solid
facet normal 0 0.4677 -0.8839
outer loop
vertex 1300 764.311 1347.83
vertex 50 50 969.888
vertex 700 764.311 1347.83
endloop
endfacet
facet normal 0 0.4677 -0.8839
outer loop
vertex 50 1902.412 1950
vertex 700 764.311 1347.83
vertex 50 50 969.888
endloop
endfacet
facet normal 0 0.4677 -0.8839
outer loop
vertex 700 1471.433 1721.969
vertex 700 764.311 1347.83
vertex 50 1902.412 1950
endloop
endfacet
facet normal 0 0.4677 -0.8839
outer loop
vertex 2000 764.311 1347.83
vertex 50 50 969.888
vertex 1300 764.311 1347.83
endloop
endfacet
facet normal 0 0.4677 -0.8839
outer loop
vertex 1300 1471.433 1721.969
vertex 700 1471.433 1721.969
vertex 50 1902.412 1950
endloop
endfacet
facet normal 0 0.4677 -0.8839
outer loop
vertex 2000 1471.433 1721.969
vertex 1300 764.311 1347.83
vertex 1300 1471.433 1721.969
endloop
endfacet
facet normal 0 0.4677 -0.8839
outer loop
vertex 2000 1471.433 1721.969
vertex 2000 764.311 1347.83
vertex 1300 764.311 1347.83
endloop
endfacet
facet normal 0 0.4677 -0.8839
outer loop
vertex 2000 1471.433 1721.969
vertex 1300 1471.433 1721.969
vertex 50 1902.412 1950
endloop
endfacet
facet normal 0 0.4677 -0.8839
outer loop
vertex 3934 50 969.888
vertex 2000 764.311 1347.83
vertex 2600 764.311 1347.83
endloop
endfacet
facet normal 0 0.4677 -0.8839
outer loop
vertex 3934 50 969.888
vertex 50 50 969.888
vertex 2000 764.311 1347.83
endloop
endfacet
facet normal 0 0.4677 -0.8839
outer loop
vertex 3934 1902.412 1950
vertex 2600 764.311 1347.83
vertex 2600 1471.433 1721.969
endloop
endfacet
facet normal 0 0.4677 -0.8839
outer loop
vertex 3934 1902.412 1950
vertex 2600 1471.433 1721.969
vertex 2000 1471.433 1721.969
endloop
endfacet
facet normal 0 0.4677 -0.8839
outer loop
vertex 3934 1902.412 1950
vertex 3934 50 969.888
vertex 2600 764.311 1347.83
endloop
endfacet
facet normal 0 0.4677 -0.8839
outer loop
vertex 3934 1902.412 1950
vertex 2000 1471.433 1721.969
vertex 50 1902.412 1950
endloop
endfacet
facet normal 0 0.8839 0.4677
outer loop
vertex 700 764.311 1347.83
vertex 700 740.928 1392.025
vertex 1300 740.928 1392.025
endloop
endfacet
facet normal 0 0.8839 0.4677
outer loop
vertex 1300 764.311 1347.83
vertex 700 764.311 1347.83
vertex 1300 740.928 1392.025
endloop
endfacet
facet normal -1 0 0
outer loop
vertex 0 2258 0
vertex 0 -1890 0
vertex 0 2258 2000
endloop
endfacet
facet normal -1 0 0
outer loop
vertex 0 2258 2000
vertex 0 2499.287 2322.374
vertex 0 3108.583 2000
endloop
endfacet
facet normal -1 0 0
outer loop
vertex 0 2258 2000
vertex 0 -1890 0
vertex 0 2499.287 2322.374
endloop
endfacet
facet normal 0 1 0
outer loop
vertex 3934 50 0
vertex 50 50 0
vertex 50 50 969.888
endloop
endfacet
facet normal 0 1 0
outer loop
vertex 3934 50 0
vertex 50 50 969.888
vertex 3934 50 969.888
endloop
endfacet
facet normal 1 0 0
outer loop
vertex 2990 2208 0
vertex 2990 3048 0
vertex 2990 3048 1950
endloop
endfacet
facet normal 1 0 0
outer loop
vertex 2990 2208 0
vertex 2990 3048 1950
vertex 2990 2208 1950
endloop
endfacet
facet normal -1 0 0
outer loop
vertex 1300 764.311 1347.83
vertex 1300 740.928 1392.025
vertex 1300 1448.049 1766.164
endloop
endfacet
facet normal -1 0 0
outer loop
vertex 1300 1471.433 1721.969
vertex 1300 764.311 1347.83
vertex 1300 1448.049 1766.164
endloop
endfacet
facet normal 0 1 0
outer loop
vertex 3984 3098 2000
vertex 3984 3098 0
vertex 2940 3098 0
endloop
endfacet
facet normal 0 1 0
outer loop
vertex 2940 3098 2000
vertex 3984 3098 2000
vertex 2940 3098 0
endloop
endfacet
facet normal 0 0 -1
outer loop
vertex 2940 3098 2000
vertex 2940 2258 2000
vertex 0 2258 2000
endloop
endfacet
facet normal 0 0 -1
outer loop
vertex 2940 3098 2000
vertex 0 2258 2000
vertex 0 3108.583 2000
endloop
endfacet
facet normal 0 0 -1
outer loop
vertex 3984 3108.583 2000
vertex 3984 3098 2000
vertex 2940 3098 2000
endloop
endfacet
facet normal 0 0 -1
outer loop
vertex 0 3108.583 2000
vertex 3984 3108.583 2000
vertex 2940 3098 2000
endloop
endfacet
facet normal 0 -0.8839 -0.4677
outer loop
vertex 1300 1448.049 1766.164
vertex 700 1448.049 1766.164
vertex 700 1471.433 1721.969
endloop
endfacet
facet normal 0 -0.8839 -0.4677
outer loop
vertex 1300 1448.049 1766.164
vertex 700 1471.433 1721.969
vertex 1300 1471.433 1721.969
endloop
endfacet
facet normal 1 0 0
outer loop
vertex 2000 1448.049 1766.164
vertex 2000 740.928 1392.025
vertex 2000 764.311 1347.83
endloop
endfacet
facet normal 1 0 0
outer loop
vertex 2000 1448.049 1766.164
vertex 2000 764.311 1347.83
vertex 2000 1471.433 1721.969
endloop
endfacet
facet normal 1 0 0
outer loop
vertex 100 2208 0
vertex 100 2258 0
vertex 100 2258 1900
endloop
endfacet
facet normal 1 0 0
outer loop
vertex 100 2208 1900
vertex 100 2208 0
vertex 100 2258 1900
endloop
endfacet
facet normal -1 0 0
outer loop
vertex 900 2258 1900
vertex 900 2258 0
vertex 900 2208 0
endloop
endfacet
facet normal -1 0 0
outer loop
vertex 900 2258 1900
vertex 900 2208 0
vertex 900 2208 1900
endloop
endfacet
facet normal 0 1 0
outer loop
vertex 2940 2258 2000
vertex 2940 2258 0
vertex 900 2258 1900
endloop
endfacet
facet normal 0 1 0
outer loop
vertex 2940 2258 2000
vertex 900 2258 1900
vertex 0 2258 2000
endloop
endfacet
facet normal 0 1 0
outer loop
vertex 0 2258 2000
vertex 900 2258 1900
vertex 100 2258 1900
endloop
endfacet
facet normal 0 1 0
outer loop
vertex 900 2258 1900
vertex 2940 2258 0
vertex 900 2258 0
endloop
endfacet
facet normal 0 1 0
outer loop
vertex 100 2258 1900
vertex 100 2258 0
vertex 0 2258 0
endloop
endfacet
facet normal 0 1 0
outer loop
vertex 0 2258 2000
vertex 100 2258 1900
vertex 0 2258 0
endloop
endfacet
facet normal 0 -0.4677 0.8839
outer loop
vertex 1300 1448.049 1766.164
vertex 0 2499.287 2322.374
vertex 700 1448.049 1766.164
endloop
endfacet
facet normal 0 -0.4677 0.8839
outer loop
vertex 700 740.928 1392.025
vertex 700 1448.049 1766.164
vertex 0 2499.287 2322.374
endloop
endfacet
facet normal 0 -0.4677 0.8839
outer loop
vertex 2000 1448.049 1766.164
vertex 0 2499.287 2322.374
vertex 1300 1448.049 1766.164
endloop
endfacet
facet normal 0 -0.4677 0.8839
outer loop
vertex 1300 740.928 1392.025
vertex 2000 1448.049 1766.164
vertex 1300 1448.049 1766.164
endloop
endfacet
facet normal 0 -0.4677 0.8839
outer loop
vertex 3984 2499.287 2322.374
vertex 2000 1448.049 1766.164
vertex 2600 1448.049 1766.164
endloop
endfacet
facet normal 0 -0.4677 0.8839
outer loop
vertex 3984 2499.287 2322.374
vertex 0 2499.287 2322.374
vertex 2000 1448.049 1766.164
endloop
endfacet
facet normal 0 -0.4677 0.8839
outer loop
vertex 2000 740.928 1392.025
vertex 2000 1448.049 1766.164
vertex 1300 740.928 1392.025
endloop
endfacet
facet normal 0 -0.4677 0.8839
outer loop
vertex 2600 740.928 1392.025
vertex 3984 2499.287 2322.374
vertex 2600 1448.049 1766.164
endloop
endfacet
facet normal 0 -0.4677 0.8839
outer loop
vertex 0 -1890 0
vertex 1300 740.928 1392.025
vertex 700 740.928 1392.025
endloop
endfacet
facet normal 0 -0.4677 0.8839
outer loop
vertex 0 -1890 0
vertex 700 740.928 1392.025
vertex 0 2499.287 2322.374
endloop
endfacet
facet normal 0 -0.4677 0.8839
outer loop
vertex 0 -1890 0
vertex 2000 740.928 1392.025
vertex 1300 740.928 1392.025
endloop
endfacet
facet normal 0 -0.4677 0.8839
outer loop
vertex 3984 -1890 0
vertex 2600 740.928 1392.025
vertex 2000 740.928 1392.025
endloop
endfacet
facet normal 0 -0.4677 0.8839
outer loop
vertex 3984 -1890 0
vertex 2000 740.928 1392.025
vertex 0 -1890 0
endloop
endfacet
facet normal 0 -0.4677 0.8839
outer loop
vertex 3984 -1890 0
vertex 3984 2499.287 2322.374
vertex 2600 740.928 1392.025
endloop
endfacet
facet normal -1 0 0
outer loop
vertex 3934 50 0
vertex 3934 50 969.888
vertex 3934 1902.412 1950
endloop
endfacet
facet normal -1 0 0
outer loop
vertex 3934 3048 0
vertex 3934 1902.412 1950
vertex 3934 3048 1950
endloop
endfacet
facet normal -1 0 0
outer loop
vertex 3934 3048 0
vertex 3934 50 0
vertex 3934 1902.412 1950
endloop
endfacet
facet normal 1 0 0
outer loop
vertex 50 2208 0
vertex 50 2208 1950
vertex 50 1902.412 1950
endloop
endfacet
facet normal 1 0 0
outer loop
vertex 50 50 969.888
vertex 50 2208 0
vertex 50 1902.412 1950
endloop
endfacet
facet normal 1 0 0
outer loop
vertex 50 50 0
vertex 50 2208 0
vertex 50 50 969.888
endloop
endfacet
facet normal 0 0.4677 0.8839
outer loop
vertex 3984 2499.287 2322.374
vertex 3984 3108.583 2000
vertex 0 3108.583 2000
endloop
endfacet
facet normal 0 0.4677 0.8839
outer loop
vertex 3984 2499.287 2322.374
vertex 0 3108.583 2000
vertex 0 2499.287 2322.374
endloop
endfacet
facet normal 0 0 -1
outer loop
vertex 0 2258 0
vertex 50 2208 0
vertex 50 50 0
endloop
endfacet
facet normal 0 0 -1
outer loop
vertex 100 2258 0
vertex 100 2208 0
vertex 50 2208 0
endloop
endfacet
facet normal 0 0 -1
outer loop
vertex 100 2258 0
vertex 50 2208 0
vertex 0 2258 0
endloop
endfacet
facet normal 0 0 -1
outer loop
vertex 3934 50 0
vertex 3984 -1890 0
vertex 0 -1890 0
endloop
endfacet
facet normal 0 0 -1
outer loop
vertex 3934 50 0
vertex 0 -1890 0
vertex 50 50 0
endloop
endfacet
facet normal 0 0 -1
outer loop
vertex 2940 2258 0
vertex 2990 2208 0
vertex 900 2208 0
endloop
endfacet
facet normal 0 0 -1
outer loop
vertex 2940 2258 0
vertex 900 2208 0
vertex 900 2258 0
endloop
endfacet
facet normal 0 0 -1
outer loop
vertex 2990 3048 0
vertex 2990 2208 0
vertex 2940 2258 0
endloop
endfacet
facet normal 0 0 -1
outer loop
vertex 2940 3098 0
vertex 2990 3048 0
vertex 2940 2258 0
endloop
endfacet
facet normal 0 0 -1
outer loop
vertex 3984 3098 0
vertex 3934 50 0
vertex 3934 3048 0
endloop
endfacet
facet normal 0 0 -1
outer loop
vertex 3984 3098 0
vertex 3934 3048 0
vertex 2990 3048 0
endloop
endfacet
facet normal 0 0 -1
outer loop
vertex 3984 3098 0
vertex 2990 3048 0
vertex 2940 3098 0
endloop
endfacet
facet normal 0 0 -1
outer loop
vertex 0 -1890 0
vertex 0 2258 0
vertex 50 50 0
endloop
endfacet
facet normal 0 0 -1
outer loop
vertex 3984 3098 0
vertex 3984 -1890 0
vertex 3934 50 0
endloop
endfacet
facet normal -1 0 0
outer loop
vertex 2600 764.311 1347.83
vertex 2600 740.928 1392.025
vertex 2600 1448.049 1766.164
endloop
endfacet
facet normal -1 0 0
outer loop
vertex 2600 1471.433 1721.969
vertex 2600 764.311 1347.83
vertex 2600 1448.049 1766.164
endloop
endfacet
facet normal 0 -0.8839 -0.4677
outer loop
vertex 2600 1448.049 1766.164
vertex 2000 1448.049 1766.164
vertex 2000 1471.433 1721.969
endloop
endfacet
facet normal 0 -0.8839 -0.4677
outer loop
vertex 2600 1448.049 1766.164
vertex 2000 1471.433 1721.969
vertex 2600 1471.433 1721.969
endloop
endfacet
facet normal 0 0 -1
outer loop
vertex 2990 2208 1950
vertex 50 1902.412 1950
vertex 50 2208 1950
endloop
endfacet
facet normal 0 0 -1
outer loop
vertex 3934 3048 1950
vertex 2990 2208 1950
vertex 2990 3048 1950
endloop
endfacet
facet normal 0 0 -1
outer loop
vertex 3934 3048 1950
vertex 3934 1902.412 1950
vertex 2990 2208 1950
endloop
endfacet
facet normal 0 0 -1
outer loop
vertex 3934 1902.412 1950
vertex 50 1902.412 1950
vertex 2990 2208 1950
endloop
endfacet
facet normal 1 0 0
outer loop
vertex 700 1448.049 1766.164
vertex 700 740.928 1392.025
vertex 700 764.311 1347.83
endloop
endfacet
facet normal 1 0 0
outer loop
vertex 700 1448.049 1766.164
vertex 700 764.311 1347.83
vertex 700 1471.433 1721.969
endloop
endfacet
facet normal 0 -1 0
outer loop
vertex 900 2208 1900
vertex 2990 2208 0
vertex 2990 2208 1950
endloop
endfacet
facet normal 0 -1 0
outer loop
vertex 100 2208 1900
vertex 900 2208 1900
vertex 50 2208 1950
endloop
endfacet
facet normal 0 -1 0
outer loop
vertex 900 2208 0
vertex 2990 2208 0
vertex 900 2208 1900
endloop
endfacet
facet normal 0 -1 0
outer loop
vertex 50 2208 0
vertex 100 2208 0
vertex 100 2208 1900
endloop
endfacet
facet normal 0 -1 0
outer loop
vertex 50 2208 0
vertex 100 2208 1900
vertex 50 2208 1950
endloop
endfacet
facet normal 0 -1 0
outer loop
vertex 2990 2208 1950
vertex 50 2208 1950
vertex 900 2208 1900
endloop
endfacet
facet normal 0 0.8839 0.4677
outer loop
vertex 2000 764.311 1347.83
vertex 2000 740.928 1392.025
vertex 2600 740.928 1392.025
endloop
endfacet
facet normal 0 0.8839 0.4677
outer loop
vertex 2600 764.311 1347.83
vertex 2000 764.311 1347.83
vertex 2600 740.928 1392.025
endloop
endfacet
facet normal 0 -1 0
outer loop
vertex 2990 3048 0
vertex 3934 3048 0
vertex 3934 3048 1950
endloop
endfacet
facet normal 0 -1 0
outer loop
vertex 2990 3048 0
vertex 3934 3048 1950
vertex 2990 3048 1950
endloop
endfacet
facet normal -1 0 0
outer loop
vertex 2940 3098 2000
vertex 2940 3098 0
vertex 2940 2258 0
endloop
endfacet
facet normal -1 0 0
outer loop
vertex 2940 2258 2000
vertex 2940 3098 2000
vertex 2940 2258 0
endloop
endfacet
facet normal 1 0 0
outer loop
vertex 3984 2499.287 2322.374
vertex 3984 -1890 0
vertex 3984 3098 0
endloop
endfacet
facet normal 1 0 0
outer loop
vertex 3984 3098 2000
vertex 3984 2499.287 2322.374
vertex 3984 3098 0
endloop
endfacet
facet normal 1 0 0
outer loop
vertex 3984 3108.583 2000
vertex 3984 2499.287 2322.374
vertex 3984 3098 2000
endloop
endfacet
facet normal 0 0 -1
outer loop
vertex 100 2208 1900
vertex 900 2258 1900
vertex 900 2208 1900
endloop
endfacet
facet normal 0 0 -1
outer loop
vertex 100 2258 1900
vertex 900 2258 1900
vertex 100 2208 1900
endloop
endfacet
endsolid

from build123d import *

# Parameters (mm, degrees)
F1_DEPTH  = 2500
F3_DEPTH  = 3984
F4_T      = -50
F5_W      = 800
F5_H      = 1900
F6_DEPTH  = 50
F7_W      = 600
F7_H      = 800
F8_DEPTH  = 50
F10_DEPTH = 3984


with BuildPart() as f1:
    # F0 (on Top) → F1 (new body)
    with BuildSketch(Plane.XY):
        Polygon((0, 2258), (0, 0), (3984, 0), (3984, 3098), (2940, 3098), (2940, 2258), align=None)
    extrude(amount=F1_DEPTH)

    # F2 (on face) → F3 (cut, through all)
    with BuildSketch(Plane.YZ.offset(3984)):
        Polygon((0, 2500), (0, 1000), (1890, 2000), (3098, 2000), (3098, 2500), align=None)
    extrude(amount=-F3_DEPTH, mode=Mode.SUBTRACT)

    # F4
    f4_openings = [f1.faces().sort_by_distance(p)[0] for p in [
        (2122.573598, 1266.590819, 0),
    ]]
    offset(amount=F4_T, openings=f4_openings, kind=Kind.INTERSECTION)

    # F5 (on face) → F6 (cut, through all)
    with BuildSketch(Plane(origin=(0, 2258, 0), x_dir=(-1, 0, 0), z_dir=(0, 1, 0))):
        with Locations((-500, 950)):
            Rectangle(F5_W, F5_H)
    extrude(amount=-F6_DEPTH, mode=Mode.SUBTRACT)

    # F7 (on face) → F8 (cut, through all)
    with BuildSketch(Plane(origin=(0, -413.3767852847, 781.282124188), x_dir=(1, 0, 0), z_dir=(0, -0.4676728299, 0.8839016485))):
        with Locations((1000, 1705.9197753983)):
            Rectangle(F7_W, F7_H)
        with Locations((2300, 1705.9197753983)):
            Rectangle(F7_W, F7_H)
    extrude(amount=-F8_DEPTH, mode=Mode.SUBTRACT)

    # F9 (on face) → F10 (join, through all)
    with BuildSketch(Plane.YZ.offset(3984)):
        Polygon((0, 0), (0, 1000), (-1890, 0), align=None)
        Polygon((2499.2872246901, 2322.3741929577), (1890, 2000), (3108.5832118988, 2000), align=None)
    extrude(amount=-F10_DEPTH)


solid = f1.part
